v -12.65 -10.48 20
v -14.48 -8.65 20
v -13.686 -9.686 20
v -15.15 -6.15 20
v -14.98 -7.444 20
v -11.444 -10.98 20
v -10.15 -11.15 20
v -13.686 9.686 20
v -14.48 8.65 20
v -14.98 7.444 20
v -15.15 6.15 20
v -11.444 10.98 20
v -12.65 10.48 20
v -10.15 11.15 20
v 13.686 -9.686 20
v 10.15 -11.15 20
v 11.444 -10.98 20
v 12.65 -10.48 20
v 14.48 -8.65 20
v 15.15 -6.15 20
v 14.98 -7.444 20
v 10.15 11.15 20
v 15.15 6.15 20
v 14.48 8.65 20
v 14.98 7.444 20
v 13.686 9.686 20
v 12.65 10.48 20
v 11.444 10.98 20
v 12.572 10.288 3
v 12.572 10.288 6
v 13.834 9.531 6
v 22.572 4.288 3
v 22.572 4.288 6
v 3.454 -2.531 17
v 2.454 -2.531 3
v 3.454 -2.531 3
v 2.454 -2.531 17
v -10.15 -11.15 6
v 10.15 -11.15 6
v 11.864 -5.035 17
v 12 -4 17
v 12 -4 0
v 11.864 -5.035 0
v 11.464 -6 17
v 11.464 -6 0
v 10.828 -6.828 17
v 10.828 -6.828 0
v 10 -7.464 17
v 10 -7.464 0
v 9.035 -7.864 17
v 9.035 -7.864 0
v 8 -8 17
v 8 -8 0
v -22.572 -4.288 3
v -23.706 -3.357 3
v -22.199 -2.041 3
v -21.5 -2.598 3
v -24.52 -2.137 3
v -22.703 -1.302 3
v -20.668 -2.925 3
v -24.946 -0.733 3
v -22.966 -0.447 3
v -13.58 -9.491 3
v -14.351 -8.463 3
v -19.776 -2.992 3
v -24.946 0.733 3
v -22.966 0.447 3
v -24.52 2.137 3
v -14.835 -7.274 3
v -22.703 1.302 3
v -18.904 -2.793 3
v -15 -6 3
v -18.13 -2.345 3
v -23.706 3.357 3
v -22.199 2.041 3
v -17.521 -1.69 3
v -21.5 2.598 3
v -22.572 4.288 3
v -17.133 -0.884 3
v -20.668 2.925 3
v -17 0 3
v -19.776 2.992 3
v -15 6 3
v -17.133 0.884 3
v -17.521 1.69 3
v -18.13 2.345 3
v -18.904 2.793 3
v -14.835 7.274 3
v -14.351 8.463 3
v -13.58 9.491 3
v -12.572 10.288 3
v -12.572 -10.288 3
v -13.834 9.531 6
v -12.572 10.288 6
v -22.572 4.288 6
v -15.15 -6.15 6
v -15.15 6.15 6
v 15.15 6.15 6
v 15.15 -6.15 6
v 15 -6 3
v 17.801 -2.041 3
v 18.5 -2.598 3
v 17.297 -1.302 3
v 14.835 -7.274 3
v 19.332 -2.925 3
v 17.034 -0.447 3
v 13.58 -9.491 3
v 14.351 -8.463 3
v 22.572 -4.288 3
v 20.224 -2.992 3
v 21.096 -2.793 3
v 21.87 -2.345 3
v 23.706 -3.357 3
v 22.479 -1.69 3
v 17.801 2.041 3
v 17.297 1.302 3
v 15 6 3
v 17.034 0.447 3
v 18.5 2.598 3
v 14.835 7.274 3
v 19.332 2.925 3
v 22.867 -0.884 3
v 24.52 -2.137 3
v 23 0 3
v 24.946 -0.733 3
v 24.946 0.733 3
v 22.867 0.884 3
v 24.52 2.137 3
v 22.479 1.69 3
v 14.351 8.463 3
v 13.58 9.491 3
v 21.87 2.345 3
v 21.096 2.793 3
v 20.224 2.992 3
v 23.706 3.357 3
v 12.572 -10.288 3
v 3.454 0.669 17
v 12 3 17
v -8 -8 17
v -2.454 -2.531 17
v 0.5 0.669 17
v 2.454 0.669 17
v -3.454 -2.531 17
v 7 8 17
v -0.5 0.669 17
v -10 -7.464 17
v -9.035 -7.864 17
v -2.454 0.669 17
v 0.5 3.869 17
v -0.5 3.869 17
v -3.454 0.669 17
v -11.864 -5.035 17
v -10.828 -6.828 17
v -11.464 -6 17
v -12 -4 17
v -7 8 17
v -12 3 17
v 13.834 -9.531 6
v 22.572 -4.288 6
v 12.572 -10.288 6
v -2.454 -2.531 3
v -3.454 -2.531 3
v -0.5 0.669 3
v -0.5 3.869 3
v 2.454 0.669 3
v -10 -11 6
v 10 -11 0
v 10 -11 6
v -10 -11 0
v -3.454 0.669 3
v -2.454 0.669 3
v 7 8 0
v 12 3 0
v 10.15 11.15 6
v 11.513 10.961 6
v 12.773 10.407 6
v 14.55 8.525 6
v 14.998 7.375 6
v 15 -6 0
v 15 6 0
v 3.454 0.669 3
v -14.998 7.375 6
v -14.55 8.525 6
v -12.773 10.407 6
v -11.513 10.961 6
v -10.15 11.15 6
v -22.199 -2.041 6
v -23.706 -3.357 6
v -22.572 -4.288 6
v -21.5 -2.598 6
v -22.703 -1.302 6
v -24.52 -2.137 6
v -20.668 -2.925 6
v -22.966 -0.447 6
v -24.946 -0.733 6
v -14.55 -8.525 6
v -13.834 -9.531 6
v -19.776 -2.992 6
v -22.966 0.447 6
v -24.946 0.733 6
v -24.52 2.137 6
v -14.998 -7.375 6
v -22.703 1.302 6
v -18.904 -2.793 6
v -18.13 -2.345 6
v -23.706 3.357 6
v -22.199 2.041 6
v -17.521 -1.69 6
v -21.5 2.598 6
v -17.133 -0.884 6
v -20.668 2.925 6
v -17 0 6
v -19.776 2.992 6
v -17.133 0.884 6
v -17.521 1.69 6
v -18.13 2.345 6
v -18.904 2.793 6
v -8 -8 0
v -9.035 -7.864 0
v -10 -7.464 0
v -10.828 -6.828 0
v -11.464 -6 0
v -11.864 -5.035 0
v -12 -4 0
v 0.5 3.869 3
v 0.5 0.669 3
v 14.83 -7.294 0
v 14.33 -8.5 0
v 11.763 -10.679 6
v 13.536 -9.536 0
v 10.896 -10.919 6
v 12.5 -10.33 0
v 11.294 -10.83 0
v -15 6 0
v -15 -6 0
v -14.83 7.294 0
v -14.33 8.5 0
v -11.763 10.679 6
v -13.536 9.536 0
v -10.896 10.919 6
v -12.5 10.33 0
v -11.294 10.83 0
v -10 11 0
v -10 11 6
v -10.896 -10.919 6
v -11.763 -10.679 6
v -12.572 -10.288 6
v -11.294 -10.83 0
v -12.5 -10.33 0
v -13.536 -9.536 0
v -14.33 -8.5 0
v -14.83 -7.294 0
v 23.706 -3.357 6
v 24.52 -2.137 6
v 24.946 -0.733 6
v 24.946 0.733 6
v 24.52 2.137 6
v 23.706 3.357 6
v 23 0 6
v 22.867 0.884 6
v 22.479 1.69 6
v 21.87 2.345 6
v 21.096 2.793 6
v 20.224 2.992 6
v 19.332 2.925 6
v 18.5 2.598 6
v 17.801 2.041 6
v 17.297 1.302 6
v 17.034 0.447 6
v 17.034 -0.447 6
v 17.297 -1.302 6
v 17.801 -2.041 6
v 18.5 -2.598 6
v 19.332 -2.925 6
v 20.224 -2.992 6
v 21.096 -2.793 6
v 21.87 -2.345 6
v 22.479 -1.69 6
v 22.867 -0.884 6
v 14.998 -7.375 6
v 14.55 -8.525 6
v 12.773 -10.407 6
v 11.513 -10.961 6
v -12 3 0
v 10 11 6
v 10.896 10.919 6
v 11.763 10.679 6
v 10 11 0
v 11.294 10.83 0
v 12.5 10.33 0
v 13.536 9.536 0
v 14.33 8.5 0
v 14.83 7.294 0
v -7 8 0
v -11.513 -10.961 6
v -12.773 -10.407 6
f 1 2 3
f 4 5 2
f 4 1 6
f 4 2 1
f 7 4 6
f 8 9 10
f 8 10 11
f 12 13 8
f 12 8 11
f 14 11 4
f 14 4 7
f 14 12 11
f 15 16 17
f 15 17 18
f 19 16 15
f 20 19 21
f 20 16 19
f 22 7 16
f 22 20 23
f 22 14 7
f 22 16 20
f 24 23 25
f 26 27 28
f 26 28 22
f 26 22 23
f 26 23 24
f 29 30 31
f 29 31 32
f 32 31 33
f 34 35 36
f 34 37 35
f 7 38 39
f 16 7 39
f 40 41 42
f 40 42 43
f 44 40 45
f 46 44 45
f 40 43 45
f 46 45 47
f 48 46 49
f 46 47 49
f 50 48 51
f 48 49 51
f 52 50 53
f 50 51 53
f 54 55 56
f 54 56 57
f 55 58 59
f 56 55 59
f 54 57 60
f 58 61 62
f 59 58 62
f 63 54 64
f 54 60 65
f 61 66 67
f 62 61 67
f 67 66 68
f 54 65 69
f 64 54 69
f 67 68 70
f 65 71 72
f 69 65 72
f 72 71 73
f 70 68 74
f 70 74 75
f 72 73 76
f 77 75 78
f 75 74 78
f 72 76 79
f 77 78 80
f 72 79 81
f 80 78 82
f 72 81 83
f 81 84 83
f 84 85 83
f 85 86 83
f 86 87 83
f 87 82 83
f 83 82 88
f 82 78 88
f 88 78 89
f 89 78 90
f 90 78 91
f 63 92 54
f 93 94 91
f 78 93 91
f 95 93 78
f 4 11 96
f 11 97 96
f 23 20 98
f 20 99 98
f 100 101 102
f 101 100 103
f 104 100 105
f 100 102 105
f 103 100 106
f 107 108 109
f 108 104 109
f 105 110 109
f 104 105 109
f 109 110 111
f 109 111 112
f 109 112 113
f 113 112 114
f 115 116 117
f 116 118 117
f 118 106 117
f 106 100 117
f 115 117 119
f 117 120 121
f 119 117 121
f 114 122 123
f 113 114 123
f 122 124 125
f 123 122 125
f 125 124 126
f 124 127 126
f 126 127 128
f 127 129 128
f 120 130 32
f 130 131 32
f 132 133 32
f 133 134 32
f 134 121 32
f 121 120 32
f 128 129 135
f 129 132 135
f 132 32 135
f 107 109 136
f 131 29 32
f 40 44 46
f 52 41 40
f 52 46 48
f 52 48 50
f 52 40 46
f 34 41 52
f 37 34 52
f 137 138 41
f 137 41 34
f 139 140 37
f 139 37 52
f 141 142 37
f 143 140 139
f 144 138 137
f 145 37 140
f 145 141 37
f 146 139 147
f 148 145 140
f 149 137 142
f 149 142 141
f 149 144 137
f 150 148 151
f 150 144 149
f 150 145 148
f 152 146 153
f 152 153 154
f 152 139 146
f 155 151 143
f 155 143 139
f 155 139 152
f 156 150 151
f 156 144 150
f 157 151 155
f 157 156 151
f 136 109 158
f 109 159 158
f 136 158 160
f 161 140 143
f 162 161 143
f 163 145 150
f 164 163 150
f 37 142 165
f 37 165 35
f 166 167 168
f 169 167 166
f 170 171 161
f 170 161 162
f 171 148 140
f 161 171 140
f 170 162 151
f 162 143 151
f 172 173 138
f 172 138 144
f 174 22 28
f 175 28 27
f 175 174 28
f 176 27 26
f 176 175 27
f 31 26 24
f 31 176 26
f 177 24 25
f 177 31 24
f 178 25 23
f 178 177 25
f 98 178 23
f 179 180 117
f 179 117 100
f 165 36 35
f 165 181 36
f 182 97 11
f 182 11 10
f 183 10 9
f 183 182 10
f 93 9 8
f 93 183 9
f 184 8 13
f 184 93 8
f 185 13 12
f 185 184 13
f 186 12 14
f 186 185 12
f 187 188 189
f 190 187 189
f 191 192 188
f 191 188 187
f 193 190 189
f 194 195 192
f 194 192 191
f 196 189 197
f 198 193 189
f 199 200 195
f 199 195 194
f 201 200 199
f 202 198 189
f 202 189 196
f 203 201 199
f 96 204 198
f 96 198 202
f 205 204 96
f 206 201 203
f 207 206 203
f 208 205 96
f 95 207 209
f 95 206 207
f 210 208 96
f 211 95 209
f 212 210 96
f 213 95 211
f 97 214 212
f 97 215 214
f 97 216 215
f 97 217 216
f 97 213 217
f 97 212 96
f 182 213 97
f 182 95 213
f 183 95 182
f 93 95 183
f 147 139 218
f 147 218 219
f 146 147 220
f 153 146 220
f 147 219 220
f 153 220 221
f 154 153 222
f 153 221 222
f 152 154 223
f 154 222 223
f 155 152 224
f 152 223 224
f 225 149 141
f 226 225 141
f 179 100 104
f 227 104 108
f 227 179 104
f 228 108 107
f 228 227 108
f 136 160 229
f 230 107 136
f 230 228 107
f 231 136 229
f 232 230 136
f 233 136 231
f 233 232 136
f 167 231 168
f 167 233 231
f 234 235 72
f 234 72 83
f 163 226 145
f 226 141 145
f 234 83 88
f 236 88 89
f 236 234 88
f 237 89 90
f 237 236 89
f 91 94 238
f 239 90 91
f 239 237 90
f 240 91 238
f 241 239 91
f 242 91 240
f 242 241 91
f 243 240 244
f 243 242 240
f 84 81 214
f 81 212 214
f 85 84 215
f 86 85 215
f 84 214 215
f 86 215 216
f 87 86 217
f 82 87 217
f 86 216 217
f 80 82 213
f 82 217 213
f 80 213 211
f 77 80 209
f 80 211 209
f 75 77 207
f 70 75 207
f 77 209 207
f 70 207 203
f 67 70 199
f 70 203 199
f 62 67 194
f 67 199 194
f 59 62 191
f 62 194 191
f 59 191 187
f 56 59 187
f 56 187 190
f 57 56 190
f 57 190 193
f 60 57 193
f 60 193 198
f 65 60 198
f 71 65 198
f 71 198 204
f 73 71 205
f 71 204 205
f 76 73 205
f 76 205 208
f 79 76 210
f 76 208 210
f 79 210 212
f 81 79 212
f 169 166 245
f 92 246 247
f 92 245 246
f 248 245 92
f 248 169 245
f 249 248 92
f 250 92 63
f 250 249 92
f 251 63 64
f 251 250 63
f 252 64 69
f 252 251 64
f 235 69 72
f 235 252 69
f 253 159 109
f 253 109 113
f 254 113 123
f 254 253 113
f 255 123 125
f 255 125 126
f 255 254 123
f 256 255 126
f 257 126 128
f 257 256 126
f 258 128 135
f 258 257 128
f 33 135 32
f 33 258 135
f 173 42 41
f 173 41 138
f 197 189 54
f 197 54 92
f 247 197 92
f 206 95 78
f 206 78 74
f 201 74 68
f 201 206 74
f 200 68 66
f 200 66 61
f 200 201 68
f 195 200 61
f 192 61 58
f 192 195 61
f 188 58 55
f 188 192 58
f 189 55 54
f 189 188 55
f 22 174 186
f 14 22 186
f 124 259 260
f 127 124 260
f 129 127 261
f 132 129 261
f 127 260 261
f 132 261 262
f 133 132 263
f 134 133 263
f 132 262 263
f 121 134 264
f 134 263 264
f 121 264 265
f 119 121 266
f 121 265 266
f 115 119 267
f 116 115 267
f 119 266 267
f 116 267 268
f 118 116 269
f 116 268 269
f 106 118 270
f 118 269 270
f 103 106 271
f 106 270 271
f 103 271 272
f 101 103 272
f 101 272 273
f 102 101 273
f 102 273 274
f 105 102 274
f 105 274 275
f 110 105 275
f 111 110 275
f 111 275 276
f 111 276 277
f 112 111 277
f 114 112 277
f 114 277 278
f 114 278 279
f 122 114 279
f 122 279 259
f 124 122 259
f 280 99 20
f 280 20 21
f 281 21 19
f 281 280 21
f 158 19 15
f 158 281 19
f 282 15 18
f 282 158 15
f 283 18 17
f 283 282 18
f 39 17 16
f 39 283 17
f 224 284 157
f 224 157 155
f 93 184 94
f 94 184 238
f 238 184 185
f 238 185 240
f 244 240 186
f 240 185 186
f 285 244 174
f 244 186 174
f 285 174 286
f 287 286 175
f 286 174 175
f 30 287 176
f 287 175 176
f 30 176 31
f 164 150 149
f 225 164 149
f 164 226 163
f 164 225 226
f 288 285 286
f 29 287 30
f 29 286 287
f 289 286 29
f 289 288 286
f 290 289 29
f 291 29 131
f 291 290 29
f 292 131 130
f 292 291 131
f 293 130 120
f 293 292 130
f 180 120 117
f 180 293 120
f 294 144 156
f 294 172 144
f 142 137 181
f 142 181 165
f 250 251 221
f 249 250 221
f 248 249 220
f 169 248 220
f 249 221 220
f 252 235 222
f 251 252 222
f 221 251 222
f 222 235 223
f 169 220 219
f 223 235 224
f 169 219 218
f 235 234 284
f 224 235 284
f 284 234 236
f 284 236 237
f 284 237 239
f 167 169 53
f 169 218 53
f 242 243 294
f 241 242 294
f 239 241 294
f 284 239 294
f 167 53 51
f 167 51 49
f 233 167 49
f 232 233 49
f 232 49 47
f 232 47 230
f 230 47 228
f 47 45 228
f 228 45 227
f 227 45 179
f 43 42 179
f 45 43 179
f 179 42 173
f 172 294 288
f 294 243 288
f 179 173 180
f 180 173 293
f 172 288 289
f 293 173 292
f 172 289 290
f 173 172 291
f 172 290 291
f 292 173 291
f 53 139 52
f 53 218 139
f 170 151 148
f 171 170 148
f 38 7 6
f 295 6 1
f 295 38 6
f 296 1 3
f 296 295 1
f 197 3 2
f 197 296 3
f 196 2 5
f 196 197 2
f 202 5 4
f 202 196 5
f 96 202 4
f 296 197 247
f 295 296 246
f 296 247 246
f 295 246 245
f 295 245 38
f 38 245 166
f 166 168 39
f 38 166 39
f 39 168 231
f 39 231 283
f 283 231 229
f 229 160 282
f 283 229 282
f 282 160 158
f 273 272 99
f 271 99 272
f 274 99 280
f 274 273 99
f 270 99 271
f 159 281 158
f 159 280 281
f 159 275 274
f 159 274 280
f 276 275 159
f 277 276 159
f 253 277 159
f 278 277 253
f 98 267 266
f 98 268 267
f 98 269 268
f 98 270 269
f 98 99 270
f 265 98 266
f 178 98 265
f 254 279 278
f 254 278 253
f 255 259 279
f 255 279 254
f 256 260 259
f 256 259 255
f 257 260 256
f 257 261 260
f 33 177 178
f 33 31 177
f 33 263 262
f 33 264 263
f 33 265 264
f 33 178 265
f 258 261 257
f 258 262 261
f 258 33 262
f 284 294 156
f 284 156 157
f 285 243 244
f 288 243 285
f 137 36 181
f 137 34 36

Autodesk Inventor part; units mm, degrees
ref_plane "YZ Plane" through (0, 0, 0) normal (1, 0, 0) x (0, 1, 0)
ref_plane "XZ Plane" through (0, 0, 0) normal (0, 1, 0) x (-1, 0, 0)
ref_plane "XY Plane" through (0, 0, 0) normal (0, 0, 1) x (1, 0, 0)
sketch "Sketch1" plane through (0, 0, 0) normal (0, 0, 1) x (1, 0, 0)
  line L0 (-10, 11) -> (10, 11)
  line L1 (15, 6) -> (15, -6)
  line L2 (10, -11) -> (-10, -11)
  line L3 (-15, -6) -> (-15, 6)
  line L4 (-15, 11) -> (15, -11) construction
  line L5 (15, 11) -> (-15, -11) construction
  arc A0 (-10, 11) -> (-15, 6) centre (-10, 6) ccw
  arc A1 (15, 6) -> (10, 11) centre (10, 6) ccw
  arc A2 (10, -11) -> (15, -6) centre (10, -6) ccw
  arc A3 (-15, -6) -> (-10, -11) centre (-10, -6) ccw
  point P0 (0, 0)
  dimension "d0" = 22
  dimension "d1" = 30
  dimension "d2" = 5
extrude "Extrusion1" add sketch "Sketch1" along normal blind 6
sketch "Sketch2" plane through (0, 0, 6) normal (0, 0, 1) x (1, 0, 0)
  arc A0 (-10, 11) -> (-15, 6) centre (-10, 6) ccw projected
  line L0 (-12.5725, 10.2875) -> (-22.5725, 4.2875)
  arc A1 (-22.5725, 4.2875) -> (-22.5725, -4.2875) centre (-20, 0) ccw
  line L1 (-22.5725, -4.2875) -> (-12.5725, -10.2875)
  arc A2 (-15, -6) -> (-10, -11) centre (-10, -6) ccw projected
  line L2 (-15, 6) -> (-15, -6) projected
  line L3 (0, 0) -> (0, 5.4971)
  arc A3 (15, 6) -> (10, 11) centre (10, 6) ccw
  line L4 (12.5725, 10.2875) -> (22.5725, 4.2875)
  arc A4 (22.5725, -4.2875) -> (22.5725, 4.2875) centre (20, 0) ccw
  line L5 (22.5725, -4.2875) -> (12.5725, -10.2875)
  arc A5 (10, -11) -> (15, -6) centre (10, -6) ccw
  line L6 (15, 6) -> (15, -6)
  dimension "d5" = 5
  dimension "d6" = 40
extrude "Extrusion2" add sketch "Sketch2" against normal blind 3
sketch "Sketch3" plane through (0, 0, 6) normal (0, 0, 1) x (1, 0, 0)
  circle A0 centre (-20, 0) radius 3
  circle A1 centre (20, 0) radius 3
  arc A2 (-22.5725, 4.2875) -> (-22.5725, -4.2875) centre (-20, 0) ccw projected
  arc A3 (22.5725, -4.2875) -> (22.5725, 4.2875) centre (20, 0) ccw projected
  point P0 (0, 0)
  dimension "d9" = 6
  dimension "d10" = 6
extrude "Extrusion3" cut sketch "Sketch3" against normal blind 3
sketch "Sketch4" plane through (0, 0, 6) normal (0, 0, 1) x (1, 0, 0)
  line L0 (-10.15, -11.15) -> (10.15, -11.15)
  line L1 (15.15, -6.15) -> (15.15, 6.15)
  line L2 (10.15, 11.15) -> (-10.15, 11.15)
  line L3 (-15.15, 6.15) -> (-15.15, -6.15)
  line L4 (-15.15, -11.15) -> (15.15, 11.15) construction
  line L5 (15.15, -11.15) -> (-15.15, 11.15) construction
  arc A0 (-10.15, 11.15) -> (-15.15, 6.15) centre (-10.15, 6.15) ccw
  arc A1 (15.15, 6.15) -> (10.15, 11.15) centre (10.15, 6.15) ccw
  arc A2 (10.15, -11.15) -> (15.15, -6.15) centre (10.15, -6.15) ccw
  arc A3 (-15.15, -6.15) -> (-10.15, -11.15) centre (-10.15, -6.15) ccw
  point P0 (0, 0)
  dimension "d13" = 22.3
  dimension "d14" = 30.3
  dimension "d15" = 5
extrude "Extrusion4" add sketch "Sketch4" along normal blind 14
sketch "Sketch5" plane through (0, 0, 0) normal (0, 0, -1) x (-1, 0, 0)
  line L0 (-7, 8) -> (7, 8)
  line L1 (12, 3) -> (12, -4)
  line L2 (8, -8) -> (-8, -8)
  line L3 (-12, -4) -> (-12, 3)
  line L4 (-12, 8) -> (12, -8) construction
  line L5 (12, 8) -> (-12, -8) construction
  line L6 (-12, 3) -> (-7, 8)
  line L7 (7, 8) -> (12, 3)
  arc A0 (-12, -4) -> (-8, -8) centre (-8, -4) ccw
  arc A1 (8, -8) -> (12, -4) centre (8, -4) ccw
  point P0 (0, 0)
  dimension "d18" = 16
  dimension "d19" = 24
  dimension "d20" = 5
  dimension "d21" = 5
  dimension "d22" = 5
  dimension "d23" = 5
  dimension "d24" = 4
extrude "Extrusion5" cut sketch "Sketch5" against normal blind 17
sketch "Sketch7" plane through (0, 0, 17) normal (0, 0, -1) x (-1, 0, 0)
  line L0 (0.5, 3.8693) -> (-0.5, 3.8693)
  line L1 (-0.5, 3.8693) -> (-0.5, 0.6693)
  line L2 (-0.5, 0.6693) -> (0.5, 0.6693)
  line L3 (0.5, 0.6693) -> (0.5, 3.8693)
  line L4 (0.5, 3.8693) -> (-0.5, 0.6693) construction
  line L5 (-0.5, 3.8693) -> (0.5, 0.6693) construction
  line L6 (3.4545, 0.6693) -> (2.4545, 0.6693)
  line L7 (2.4545, 0.6693) -> (2.4545, -2.5307)
  line L8 (2.4545, -2.5307) -> (3.4545, -2.5307)
  line L9 (3.4545, -2.5307) -> (3.4545, 0.6693)
  line L10 (3.4545, 0.6693) -> (2.4545, -2.5307) construction
  line L11 (2.4545, 0.6693) -> (3.4545, -2.5307) construction
  line L12 (0, 0) -> (0, -2.165)
  line L13 (-3.4545, 0.6693) -> (-2.4545, 0.6693)
  line L14 (-2.4545, 0.6693) -> (-2.4545, -2.5307)
  line L15 (-2.4545, -2.5307) -> (-3.4545, -2.5307)
  line L16 (-3.4545, -2.5307) -> (-3.4545, 0.6693)
  line L17 (-3.4545, 0.6693) -> (-2.4545, -2.5307) construction
  line L18 (-2.4545, 0.6693) -> (-3.4545, -2.5307) construction
  point P0 (0, 2.2693)
  point P1 (2.9545, -0.9307)
  point P2 (-2.9545, -0.9307)
  point P3 (-2.9545, 0.6693)
  dimension "d27" = 1
  dimension "d28" = 1
  dimension "d29" = 3.2
  dimension "d30" = 3.2
  dimension "d31" = 0
extrude "Extrusion6" add sketch "Sketch7" along normal blind 14
equation "\"d21\" = d20"
equation "\"d22\" = d20"
equation "\"d23\" = d22"
properties part number "power_socket_24V"
